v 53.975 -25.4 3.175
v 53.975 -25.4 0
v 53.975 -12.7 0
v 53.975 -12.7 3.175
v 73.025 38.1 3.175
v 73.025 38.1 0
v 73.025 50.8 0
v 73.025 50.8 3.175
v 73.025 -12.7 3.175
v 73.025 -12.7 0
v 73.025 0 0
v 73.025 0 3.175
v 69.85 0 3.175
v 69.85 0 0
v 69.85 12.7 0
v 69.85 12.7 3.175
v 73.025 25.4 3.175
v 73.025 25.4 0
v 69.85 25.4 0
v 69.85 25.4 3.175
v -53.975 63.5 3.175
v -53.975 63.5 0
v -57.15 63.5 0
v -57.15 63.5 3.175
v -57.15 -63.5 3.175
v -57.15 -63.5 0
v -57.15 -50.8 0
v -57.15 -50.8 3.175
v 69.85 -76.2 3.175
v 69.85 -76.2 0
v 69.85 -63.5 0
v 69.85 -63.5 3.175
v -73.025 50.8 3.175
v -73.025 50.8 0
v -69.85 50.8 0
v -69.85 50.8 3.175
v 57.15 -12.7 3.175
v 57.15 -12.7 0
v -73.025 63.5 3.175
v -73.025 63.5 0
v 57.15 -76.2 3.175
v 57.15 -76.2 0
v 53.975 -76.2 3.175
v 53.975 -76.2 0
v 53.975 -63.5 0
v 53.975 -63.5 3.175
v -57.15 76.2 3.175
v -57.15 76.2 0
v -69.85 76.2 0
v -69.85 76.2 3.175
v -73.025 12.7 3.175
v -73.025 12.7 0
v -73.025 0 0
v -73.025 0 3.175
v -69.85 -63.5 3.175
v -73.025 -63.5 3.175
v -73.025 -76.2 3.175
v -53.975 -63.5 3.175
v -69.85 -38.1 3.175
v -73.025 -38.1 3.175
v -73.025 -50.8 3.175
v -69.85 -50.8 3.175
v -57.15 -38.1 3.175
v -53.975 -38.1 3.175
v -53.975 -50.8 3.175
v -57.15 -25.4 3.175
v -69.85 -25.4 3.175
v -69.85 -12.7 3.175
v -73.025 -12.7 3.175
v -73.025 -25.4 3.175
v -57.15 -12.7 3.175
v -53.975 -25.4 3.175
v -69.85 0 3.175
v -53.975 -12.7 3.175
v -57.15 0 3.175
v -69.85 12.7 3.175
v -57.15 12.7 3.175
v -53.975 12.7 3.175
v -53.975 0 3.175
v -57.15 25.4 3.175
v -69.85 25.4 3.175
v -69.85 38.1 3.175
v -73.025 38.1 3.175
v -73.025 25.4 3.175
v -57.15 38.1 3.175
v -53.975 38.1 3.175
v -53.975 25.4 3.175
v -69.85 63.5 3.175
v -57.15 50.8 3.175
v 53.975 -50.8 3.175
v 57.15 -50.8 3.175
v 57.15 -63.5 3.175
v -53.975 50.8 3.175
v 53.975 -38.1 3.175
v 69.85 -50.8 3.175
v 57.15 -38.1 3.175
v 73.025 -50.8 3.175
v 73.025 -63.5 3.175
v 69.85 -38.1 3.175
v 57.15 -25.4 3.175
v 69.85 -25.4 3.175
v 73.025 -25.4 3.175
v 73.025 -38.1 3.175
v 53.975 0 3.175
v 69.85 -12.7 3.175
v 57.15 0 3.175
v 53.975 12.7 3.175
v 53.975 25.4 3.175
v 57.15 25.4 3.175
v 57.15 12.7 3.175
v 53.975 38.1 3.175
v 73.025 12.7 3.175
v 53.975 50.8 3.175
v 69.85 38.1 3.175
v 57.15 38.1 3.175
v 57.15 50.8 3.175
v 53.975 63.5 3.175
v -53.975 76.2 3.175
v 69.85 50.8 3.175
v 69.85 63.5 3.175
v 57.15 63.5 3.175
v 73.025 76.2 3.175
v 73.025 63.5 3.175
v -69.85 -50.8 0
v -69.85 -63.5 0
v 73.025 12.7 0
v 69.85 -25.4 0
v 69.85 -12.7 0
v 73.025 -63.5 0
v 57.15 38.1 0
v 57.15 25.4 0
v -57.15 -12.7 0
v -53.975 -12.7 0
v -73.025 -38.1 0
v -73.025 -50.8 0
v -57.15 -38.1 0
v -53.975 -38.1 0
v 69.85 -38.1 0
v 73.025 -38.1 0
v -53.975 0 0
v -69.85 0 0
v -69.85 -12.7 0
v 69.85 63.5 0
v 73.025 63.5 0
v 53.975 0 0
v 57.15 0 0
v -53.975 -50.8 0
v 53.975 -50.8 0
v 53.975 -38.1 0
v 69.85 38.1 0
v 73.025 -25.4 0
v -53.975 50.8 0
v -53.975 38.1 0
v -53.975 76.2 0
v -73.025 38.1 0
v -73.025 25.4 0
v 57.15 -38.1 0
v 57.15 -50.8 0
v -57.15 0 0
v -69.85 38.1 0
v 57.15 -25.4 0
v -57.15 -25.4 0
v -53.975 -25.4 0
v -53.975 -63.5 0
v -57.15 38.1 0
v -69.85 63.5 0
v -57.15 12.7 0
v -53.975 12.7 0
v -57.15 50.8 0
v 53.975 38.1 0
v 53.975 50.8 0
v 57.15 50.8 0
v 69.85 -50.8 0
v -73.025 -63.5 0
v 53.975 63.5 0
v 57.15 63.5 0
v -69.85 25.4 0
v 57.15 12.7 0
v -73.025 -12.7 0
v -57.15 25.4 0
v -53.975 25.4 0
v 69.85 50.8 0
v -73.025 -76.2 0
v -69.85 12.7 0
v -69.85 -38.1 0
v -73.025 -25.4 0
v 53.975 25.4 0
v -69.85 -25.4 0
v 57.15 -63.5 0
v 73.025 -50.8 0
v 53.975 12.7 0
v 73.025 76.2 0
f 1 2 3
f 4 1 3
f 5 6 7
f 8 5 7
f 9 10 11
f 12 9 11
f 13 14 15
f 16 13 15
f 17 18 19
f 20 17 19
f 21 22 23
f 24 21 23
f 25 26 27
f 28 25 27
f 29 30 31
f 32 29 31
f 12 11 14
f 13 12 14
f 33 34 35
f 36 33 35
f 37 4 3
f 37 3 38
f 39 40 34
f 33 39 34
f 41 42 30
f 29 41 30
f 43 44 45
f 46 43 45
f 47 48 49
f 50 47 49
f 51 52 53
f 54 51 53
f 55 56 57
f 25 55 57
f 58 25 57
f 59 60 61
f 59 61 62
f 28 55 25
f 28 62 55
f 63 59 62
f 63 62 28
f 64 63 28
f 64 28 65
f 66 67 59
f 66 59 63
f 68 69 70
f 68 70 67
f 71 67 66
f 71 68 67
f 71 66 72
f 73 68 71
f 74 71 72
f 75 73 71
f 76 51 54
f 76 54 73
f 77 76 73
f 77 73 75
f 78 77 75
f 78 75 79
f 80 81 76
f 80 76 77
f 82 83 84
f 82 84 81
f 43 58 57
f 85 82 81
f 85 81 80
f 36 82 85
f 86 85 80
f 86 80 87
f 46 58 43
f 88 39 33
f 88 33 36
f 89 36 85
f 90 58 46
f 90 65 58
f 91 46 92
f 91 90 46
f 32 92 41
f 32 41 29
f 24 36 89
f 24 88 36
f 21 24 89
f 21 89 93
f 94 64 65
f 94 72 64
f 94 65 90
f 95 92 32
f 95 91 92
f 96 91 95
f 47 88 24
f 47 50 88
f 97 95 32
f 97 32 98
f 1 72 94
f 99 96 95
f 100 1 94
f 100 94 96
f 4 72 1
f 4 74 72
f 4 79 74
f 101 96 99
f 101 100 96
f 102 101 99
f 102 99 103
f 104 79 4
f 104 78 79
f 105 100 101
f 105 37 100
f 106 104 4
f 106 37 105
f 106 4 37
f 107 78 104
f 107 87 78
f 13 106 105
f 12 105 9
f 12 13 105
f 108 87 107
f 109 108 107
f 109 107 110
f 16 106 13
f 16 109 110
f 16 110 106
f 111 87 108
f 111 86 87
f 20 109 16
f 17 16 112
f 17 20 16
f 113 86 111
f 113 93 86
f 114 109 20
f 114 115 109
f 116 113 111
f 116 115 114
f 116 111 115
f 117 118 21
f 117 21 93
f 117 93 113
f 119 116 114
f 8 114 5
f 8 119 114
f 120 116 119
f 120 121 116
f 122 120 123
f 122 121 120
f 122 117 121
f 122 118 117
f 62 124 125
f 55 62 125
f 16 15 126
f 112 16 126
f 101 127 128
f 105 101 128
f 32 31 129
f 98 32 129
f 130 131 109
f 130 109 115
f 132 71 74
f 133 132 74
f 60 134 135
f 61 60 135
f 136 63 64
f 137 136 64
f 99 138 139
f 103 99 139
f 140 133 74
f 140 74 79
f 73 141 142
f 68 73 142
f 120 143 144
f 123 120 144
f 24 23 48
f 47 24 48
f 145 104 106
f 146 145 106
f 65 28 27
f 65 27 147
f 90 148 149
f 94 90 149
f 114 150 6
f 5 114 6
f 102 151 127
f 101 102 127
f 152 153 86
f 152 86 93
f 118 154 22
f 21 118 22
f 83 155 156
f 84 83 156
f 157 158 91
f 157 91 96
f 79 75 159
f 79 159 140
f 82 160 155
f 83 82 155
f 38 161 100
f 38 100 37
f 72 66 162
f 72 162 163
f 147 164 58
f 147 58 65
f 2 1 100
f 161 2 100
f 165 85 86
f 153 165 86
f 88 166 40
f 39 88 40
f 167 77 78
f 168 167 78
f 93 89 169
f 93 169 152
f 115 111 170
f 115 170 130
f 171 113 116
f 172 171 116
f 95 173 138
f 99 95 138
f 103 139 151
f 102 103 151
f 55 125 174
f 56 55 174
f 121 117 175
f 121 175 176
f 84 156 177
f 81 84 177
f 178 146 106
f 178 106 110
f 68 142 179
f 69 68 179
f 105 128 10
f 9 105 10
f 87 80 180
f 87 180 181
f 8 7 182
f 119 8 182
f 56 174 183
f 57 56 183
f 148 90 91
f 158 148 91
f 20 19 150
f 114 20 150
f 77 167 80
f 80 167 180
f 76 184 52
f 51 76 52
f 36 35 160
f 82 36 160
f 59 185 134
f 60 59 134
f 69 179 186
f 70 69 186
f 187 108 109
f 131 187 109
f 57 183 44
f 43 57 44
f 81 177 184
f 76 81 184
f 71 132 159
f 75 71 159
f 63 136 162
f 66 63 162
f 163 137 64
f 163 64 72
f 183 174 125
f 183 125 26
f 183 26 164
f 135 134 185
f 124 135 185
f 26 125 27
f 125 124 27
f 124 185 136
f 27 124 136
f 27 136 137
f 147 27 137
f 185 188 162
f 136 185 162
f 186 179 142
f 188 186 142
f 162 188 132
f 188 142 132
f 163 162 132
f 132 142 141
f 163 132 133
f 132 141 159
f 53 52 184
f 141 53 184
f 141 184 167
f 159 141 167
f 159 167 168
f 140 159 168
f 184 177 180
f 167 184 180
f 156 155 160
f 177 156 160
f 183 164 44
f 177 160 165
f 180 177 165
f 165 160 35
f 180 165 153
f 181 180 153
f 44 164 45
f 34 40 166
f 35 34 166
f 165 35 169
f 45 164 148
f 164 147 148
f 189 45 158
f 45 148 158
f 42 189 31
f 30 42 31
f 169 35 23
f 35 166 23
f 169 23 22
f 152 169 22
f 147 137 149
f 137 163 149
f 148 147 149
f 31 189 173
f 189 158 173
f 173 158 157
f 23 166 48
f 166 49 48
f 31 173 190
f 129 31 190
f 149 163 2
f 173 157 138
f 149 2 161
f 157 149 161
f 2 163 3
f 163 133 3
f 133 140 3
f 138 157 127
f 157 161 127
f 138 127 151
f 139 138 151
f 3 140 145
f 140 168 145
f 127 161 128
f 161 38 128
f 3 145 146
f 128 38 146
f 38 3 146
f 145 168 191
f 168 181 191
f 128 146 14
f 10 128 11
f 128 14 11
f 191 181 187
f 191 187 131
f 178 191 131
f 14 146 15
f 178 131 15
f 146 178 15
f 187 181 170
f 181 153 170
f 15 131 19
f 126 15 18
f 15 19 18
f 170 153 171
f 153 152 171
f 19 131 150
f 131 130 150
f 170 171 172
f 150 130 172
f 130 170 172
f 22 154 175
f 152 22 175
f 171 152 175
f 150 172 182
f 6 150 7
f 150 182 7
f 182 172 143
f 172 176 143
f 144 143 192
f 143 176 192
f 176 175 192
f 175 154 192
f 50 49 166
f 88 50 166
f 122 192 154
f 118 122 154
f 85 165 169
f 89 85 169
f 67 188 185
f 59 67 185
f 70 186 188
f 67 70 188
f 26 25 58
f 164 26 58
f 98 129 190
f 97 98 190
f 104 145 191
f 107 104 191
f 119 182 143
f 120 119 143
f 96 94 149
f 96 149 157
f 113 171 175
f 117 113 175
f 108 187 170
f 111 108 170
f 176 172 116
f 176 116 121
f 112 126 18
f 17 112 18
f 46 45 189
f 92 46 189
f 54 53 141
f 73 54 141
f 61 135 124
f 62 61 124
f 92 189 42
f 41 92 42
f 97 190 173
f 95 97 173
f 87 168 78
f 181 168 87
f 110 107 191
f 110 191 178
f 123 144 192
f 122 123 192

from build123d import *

# Parameters (mm, degrees)
F0_W     = 3.175
F0_H     = 12.7
F1_DEPTH = 3.175


with BuildPart() as f1:
    # F0 (on Top) → F1 (new body)
    with BuildSketch(Plane.XY):
        Polygon((73.025, 63.5), (73.025, 76.2), (-53.975, 76.2), (-53.975, 63.5), (-57.15, 63.5), (-57.15, 76.2), (-69.85, 76.2), (-69.85, 63.5), (-73.025, 63.5), (-73.025, 50.8), (-69.85, 50.8), (-69.85, 38.1), (-73.025, 38.1), (-73.025, 25.4), (-69.85, 25.4), (-69.85, 12.7), (-73.025, 12.7), (-73.025, 0), (-69.85, 0), (-69.85, -12.7), (-73.025, -12.7), (-73.025, -25.4), (-69.85, -25.4), (-69.85, -38.1), (-73.025, -38.1), (-73.025, -50.8), (-69.85, -50.8), (-69.85, -63.5), (-73.025, -63.5), (-73.025, -76.2), (53.975, -76.2), (53.975, -63.5), (57.15, -63.5), (57.15, -76.2), (69.85, -76.2), (69.85, -63.5), (73.025, -63.5), (73.025, -50.8), (69.85, -50.8), (69.85, -38.1), (73.025, -38.1), (73.025, -25.4), (69.85, -25.4), (69.85, -12.7), (73.025, -12.7), (73.025, 0), (69.85, 0), (69.85, 12.7), (73.025, 12.7), (73.025, 25.4), (69.85, 25.4), (69.85, 38.1), (73.025, 38.1), (73.025, 50.8), (69.85, 50.8), (69.85, 63.5), align=None)
        with Locations((-55.5625, -57.15)):
            Rectangle(F0_W, F0_H, mode=Mode.SUBTRACT)
        with Locations((-55.5625, -31.75)):
            Rectangle(F0_W, F0_H, mode=Mode.SUBTRACT)
        with Locations((-55.5625, -6.35)):
            Rectangle(F0_W, F0_H, mode=Mode.SUBTRACT)
        with Locations((55.5625, -44.45)):
            Rectangle(F0_W, F0_H, mode=Mode.SUBTRACT)
        with Locations((55.5625, -19.05)):
            Rectangle(F0_W, F0_H, mode=Mode.SUBTRACT)
        with Locations((-55.5625, 19.05)):
            Rectangle(F0_W, F0_H, mode=Mode.SUBTRACT)
        with Locations((-55.5625, 44.45)):
            Rectangle(F0_W, F0_H, mode=Mode.SUBTRACT)
        with Locations((55.5625, 6.35)):
            Rectangle(F0_W, F0_H, mode=Mode.SUBTRACT)
        with Locations((55.5625, 31.75)):
            Rectangle(F0_W, F0_H, mode=Mode.SUBTRACT)
        with Locations((55.5625, 57.15)):
            Rectangle(F0_W, F0_H, mode=Mode.SUBTRACT)
    extrude(amount=F1_DEPTH)


solid = f1.part
